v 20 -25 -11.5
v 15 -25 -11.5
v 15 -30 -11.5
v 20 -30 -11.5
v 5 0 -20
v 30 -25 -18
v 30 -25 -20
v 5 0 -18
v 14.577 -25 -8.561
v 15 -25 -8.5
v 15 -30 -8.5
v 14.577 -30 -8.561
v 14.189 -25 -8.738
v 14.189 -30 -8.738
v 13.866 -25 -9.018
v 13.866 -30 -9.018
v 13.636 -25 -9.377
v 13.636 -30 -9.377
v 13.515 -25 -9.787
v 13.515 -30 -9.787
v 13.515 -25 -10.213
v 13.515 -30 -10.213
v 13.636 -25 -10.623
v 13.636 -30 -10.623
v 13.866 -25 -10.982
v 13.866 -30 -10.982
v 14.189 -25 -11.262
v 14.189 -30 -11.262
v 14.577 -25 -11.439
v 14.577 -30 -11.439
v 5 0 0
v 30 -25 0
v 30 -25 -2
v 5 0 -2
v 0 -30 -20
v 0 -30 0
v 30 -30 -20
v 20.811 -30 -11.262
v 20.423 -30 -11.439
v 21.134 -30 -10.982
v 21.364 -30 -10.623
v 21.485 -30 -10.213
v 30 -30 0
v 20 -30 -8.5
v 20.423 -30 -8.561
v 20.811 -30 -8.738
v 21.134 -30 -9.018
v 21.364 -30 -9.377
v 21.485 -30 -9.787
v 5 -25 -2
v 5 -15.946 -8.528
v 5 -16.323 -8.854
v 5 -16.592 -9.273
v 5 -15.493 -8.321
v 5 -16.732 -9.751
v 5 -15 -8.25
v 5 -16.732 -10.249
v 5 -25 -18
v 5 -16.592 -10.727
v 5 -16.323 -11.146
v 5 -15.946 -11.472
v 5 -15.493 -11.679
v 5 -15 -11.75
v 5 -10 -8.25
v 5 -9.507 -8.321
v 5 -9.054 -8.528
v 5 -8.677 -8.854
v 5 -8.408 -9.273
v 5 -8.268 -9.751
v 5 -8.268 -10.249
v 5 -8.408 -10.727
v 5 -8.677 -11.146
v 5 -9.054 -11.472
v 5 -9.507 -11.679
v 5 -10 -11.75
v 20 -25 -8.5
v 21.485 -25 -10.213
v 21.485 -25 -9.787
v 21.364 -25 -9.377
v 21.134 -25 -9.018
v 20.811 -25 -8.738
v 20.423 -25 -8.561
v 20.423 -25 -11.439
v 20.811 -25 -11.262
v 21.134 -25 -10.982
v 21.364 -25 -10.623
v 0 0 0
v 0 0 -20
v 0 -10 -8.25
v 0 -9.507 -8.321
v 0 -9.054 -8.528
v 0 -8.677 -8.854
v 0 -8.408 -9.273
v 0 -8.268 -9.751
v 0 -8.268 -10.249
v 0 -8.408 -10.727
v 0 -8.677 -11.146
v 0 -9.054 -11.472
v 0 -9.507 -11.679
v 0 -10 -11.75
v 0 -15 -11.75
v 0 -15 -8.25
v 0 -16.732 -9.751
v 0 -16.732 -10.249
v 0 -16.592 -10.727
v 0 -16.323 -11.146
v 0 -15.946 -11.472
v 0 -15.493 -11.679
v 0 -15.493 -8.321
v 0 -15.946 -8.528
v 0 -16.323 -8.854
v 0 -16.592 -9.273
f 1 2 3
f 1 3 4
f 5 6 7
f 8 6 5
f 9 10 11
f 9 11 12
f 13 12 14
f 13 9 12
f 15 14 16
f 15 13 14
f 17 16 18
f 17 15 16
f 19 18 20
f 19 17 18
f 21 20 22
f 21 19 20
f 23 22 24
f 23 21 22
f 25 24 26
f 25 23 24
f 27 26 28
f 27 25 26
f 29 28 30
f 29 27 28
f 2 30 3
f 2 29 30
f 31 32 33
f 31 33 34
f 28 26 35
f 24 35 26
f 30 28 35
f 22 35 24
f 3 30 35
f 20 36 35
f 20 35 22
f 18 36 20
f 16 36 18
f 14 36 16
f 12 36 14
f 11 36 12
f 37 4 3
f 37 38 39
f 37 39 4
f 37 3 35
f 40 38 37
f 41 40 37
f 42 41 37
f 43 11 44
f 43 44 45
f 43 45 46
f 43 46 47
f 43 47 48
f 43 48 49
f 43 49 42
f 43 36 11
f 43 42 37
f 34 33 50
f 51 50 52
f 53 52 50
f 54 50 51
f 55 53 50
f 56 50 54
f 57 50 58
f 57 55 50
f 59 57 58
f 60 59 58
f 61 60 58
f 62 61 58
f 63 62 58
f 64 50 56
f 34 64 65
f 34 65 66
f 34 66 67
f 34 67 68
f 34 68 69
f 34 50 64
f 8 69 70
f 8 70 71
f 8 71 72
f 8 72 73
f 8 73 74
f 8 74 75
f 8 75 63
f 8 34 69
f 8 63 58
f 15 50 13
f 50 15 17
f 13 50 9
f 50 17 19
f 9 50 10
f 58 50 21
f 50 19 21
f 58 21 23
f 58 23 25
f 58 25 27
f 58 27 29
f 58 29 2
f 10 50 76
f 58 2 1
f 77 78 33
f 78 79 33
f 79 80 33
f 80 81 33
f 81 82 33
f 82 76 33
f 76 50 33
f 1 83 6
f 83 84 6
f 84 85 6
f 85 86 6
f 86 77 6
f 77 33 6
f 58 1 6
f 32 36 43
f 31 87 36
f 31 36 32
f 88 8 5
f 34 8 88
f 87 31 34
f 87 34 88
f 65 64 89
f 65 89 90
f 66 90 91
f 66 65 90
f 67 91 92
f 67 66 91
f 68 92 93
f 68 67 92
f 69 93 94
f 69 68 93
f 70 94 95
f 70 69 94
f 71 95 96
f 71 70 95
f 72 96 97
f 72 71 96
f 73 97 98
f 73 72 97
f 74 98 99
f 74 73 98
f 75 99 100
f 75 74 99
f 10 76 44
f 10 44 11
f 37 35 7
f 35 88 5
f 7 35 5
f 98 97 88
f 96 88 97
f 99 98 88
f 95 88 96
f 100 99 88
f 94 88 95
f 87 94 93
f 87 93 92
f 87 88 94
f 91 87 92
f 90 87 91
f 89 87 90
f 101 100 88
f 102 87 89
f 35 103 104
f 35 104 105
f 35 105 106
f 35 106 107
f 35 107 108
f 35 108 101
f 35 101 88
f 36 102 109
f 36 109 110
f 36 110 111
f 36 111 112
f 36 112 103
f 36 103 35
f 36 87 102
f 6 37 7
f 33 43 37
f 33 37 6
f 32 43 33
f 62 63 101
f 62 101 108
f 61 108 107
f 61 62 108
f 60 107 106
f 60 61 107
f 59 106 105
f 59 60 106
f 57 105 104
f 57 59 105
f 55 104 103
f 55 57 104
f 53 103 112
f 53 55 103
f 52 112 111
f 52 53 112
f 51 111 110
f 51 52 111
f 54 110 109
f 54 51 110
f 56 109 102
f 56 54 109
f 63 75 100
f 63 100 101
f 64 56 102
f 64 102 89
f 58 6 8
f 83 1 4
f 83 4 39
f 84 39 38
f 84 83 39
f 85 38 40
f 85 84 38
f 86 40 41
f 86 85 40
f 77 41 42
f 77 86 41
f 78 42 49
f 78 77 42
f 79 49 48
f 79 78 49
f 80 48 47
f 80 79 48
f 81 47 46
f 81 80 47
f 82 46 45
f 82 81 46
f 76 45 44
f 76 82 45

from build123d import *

# Parameters (mm, degrees)
EXTRUDE_1_DEPTH     = 20
SKETCH_3_W          = 16
SKETCH_3_H          = 25
CUT_EXTRUDE_1_DEPTH = 25
CUT_EXTRUDE_2_REACH = 45.875
CUT_EXTRUDE_3_REACH = 45.875


with BuildPart() as part:
    # 草圖1 → 填料-伸長1 (new body)
    with BuildSketch(Plane.XY):
        Polygon((0, 0), (0, -30), (30, -30), (30, -25), (5, 0), align=None)
    extrude(amount=-EXTRUDE_1_DEPTH)

    # 草圖3 → 除料-伸長1 (cut)
    with BuildSketch(Plane(origin=(30, 0, 0), x_dir=(0, 0, -1), z_dir=(1, 0, 0))):
        with Locations((10, -12.5)):
            Rectangle(SKETCH_3_W, SKETCH_3_H)
    extrude(amount=-CUT_EXTRUDE_1_DEPTH, mode=Mode.SUBTRACT)

    # 草圖4 → 除料-伸長2 (cut, up to next)
    with BuildSketch(Plane(origin=(5, 0, 0), x_dir=(0, 0, -1), z_dir=(1, 0, 0)), mode=Mode.PRIVATE) as cut_extrude_2_sk1:
        with BuildLine():
            Line((11.75, -10), (11.75, -15))
            ThreePointArc((11.75, -15), (10, -16.75), (8.25, -15))
            Line((8.25, -15), (8.25, -10))
            ThreePointArc((8.25, -10), (10, -8.25), (11.75, -10))
        make_face()
    cut_extrude_2_tool1 = extrude(cut_extrude_2_sk1.sketch, amount=-CUT_EXTRUDE_2_REACH, mode=Mode.PRIVATE) & part.part
    add(cut_extrude_2_tool1.solids().sort_by_distance((5, -12.5, -10))[0], mode=Mode.SUBTRACT)

    # 草圖5 → 除料-伸長3 (cut, up to next)
    with BuildSketch(Plane(origin=(0, -25, 0), x_dir=(1, 0, 0), z_dir=(0, 1, 0)), mode=Mode.PRIVATE) as cut_extrude_3_sk1:
        with BuildLine():
            Line((15, 11.5), (20, 11.5))
            ThreePointArc((20, 11.5), (21.5, 10), (20, 8.5))
            Line((20, 8.5), (15, 8.5))
            ThreePointArc((15, 8.5), (13.5, 10), (15, 11.5))
        make_face()
    cut_extrude_3_tool1 = extrude(cut_extrude_3_sk1.sketch, amount=-CUT_EXTRUDE_3_REACH, mode=Mode.PRIVATE) & part.part
    add(cut_extrude_3_tool1.solids().sort_by_distance((17.5, -25, -10))[0], mode=Mode.SUBTRACT)


solid = part.part
